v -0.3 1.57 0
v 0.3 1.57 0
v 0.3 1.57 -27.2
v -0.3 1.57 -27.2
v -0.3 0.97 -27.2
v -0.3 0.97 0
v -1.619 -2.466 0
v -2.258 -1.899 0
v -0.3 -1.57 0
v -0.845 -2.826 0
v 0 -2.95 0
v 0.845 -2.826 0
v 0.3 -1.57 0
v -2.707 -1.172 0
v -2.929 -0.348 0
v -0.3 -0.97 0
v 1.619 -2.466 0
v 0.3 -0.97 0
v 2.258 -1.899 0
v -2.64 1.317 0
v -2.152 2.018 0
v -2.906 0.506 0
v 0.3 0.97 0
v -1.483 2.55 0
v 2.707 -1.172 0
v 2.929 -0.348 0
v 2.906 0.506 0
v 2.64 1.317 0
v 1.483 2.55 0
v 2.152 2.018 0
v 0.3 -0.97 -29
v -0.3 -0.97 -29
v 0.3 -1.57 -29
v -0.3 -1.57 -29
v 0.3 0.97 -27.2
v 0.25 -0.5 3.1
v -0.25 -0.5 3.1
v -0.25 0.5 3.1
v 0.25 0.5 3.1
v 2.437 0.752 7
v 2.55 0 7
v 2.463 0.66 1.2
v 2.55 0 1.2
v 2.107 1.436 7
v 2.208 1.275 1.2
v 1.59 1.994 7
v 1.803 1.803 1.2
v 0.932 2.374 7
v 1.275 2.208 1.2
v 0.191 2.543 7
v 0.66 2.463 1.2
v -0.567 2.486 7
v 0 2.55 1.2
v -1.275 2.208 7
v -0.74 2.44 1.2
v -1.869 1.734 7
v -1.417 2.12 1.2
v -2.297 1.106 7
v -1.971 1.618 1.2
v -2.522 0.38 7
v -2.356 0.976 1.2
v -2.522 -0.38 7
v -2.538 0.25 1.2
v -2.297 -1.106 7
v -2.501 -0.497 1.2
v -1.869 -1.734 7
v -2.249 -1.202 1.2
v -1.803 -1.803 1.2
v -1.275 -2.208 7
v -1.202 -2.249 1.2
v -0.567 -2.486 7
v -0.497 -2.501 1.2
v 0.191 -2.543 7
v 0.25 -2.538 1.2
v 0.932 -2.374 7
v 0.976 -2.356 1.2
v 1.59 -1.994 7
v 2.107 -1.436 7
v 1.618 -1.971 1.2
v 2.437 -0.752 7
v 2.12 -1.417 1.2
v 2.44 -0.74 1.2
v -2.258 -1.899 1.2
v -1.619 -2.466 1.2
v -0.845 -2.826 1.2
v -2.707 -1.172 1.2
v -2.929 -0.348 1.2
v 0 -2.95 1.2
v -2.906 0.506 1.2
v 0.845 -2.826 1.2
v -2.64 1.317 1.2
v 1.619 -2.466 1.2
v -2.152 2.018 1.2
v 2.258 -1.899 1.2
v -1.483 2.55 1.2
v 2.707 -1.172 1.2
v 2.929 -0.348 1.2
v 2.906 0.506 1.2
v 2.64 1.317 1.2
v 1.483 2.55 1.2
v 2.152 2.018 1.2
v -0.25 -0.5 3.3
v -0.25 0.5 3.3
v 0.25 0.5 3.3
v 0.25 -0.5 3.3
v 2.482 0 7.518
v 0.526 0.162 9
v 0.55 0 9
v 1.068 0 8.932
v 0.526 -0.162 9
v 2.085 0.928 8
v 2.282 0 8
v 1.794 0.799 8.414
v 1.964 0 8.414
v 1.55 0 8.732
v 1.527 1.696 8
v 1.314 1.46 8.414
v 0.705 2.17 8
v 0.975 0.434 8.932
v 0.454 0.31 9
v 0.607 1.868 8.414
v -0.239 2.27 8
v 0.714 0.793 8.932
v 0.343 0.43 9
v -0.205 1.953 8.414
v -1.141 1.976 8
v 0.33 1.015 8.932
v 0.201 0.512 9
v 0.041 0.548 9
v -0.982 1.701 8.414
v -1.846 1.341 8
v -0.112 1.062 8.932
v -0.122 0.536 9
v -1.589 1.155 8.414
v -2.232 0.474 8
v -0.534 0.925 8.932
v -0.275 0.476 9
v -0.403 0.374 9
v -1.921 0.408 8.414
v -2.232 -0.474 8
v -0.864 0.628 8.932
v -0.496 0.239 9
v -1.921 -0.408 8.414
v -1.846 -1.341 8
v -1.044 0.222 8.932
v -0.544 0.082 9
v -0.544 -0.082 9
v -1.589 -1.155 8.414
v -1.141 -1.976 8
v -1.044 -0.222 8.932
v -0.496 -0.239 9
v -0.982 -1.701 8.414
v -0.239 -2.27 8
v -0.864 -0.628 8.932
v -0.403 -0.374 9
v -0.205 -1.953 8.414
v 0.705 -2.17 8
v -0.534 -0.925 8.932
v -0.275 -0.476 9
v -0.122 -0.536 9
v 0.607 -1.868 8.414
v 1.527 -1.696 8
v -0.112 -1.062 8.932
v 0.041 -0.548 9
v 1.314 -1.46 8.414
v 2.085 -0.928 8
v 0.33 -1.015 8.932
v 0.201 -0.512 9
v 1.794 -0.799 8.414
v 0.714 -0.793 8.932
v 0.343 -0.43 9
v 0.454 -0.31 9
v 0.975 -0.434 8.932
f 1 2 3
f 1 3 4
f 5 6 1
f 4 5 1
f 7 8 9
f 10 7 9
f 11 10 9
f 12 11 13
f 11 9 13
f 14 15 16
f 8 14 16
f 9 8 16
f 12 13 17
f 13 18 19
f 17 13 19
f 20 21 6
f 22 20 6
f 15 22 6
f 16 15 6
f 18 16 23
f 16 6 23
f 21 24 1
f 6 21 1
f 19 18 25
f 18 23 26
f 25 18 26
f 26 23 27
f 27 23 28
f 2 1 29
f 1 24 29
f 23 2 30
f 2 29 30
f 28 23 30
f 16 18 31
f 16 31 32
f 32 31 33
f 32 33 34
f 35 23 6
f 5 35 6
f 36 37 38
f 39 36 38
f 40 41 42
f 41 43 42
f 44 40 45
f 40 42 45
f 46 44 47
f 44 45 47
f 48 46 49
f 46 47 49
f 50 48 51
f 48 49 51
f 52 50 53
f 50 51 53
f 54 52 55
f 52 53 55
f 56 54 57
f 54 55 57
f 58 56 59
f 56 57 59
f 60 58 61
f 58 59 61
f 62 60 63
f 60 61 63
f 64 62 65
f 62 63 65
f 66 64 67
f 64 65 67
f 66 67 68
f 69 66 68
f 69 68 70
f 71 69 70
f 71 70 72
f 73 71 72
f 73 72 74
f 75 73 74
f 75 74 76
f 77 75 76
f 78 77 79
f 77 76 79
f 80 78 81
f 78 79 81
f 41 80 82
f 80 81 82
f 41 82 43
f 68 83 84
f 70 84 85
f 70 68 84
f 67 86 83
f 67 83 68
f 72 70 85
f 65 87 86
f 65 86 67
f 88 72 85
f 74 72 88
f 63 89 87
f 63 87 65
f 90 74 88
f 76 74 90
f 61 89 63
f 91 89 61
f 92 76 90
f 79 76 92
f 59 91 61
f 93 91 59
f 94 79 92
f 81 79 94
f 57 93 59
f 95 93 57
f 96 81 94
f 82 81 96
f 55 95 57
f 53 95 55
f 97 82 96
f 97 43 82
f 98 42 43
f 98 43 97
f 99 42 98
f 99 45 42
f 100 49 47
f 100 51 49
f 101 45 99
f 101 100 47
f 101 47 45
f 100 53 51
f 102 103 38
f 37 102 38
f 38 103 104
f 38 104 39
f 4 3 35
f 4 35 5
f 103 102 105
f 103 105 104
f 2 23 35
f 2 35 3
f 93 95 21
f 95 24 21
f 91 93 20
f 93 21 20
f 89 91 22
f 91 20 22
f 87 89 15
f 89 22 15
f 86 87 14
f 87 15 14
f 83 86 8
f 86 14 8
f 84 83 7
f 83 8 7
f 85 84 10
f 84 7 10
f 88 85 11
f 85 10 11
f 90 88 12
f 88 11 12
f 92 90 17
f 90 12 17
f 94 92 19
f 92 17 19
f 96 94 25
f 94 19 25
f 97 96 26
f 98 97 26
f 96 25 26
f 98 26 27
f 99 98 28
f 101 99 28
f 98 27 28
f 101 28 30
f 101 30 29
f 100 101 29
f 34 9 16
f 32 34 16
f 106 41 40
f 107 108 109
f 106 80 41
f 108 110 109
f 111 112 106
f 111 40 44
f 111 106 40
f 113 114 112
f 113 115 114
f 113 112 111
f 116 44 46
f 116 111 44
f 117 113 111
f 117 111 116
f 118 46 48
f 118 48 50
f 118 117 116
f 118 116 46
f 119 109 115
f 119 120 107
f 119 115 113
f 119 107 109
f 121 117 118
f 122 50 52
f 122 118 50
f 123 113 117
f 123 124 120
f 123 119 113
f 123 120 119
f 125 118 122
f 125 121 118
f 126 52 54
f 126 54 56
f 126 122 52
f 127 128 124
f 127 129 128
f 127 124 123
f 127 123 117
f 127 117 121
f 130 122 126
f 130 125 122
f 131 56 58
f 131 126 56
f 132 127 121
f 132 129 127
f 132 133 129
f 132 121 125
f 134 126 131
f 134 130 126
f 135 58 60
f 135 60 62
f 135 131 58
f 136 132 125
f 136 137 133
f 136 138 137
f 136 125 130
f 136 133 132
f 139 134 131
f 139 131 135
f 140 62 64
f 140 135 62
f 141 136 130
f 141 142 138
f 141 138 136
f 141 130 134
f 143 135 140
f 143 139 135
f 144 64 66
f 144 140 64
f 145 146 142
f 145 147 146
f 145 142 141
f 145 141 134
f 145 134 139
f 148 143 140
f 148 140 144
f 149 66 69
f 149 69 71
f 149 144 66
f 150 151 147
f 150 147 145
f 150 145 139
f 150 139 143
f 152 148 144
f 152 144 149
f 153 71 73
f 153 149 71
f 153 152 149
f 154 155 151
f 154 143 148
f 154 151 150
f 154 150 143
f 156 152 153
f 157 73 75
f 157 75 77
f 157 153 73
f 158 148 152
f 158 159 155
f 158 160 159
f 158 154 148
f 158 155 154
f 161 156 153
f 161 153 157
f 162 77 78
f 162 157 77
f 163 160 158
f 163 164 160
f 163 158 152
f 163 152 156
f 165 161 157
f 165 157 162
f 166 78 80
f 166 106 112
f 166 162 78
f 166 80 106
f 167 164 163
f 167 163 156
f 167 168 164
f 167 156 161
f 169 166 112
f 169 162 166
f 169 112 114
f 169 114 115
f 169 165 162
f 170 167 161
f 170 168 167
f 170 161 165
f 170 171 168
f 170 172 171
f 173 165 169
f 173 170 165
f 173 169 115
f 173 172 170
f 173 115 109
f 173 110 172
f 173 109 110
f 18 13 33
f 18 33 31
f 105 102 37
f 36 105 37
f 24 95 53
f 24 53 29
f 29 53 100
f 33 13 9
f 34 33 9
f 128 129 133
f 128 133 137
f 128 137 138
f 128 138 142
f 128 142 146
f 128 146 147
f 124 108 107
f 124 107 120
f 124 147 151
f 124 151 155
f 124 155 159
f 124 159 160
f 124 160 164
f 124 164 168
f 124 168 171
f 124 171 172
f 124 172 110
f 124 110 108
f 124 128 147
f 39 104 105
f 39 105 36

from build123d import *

# Parameters (mm, degrees)
SZKIC2_R                         = 2.95
DODANIE_WYCI_GNI_CIE1_DEPTH      = 1.2
SZKIC3_R                         = 2.55
DODANIE_WYCI_GNI_CIE2_DEPTH      = 7.8
ZAOKR_GLENIE2_R                  = 2
SZKIC4_W                         = 4.283554882
SZKIC4_H                         = 0.750281293
WYTNIJ_WYCI_GNI_CIE1_DEPTH       = 7.8
DODANIE_WYCI_GNI_CIE5_DEPTH      = 0.25
DODANIE_WYCI_GNI_CIE5_DEPTH_BACK = 0.25
SZKIC6_W                         = 0.2
SZKIC6_H                         = 1
SZKIC7_W                         = 0.6
SZKIC7_H                         = 0.6
DODANIE_WYCI_GNI_CIE6_DEPTH      = 29
SZKIC8_W                         = 0.861364308
SZKIC8_H                         = 0.90651153
WYTNIJ_WYCI_GNI_CIE2_DEPTH       = 1.8


with BuildPart() as part:
    # Szkic2 → Dodanie-wyciągnięcie1 (new body)
    with BuildSketch(Plane.XY):
        Circle(SZKIC2_R)
    extrude(amount=DODANIE_WYCI_GNI_CIE1_DEPTH)

    # Szkic3 → Dodanie-wyciągnięcie2 (add)
    with BuildSketch(Plane.XY.offset(1.2)):
        Circle(SZKIC3_R)
    extrude(amount=DODANIE_WYCI_GNI_CIE2_DEPTH)

    # Zaokrąglenie2
    zaokr_glenie2_edges = [part.edges().sort_by_distance(p)[0] for p in [
        (-2.55, 0, 9),
    ]]
    fillet(zaokr_glenie2_edges, radius=ZAOKR_GLENIE2_R)

    # Szkic4 → Wytnij-wyciągnięcie1 (cut)
    with BuildSketch(Plane.XY.offset(1.2)):
        with Locations((0, 2.925140647)):
            Rectangle(SZKIC4_W, SZKIC4_H)
    extrude(amount=-WYTNIJ_WYCI_GNI_CIE1_DEPTH, mode=Mode.SUBTRACT)

    # Szkic7 → Dodanie-wyciągnięcie6 (add)
    with BuildSketch(Plane(origin=(0, 0, 0), x_dir=(-1, 0, 0), z_dir=(0, 0, -1))):
        with Locations((0, -1.27)):
            Rectangle(SZKIC7_W, SZKIC7_H)
        with Locations((0, 1.27)):
            Rectangle(SZKIC7_W, SZKIC7_H)
    extrude(amount=DODANIE_WYCI_GNI_CIE6_DEPTH)

    # Szkic8 → Wytnij-wyciągnięcie2 (cut)
    with BuildSketch(Plane(origin=(0, 0, -29), x_dir=(-1, 0, 0), z_dir=(0, 0, -1))):
        with Locations((0, 1.341985324)):
            Rectangle(SZKIC8_W, SZKIC8_H)
    extrude(amount=-WYTNIJ_WYCI_GNI_CIE2_DEPTH, mode=Mode.SUBTRACT)


with BuildPart() as body_2:
    # Szkic6 → Dodanie-wyciągnięcie5 (new, two sides: drawn at the far end of the back side and taken through both)
    with BuildSketch(Plane(origin=(0, 0, 0), x_dir=(0, 0, -1), z_dir=(1, 0, 0)).offset(-DODANIE_WYCI_GNI_CIE5_DEPTH_BACK)):
        with Locations((-3.2, 0)):
            Rectangle(SZKIC6_W, SZKIC6_H)
    extrude(amount=DODANIE_WYCI_GNI_CIE5_DEPTH + DODANIE_WYCI_GNI_CIE5_DEPTH_BACK)


solid = Compound([part.part, body_2.part])
